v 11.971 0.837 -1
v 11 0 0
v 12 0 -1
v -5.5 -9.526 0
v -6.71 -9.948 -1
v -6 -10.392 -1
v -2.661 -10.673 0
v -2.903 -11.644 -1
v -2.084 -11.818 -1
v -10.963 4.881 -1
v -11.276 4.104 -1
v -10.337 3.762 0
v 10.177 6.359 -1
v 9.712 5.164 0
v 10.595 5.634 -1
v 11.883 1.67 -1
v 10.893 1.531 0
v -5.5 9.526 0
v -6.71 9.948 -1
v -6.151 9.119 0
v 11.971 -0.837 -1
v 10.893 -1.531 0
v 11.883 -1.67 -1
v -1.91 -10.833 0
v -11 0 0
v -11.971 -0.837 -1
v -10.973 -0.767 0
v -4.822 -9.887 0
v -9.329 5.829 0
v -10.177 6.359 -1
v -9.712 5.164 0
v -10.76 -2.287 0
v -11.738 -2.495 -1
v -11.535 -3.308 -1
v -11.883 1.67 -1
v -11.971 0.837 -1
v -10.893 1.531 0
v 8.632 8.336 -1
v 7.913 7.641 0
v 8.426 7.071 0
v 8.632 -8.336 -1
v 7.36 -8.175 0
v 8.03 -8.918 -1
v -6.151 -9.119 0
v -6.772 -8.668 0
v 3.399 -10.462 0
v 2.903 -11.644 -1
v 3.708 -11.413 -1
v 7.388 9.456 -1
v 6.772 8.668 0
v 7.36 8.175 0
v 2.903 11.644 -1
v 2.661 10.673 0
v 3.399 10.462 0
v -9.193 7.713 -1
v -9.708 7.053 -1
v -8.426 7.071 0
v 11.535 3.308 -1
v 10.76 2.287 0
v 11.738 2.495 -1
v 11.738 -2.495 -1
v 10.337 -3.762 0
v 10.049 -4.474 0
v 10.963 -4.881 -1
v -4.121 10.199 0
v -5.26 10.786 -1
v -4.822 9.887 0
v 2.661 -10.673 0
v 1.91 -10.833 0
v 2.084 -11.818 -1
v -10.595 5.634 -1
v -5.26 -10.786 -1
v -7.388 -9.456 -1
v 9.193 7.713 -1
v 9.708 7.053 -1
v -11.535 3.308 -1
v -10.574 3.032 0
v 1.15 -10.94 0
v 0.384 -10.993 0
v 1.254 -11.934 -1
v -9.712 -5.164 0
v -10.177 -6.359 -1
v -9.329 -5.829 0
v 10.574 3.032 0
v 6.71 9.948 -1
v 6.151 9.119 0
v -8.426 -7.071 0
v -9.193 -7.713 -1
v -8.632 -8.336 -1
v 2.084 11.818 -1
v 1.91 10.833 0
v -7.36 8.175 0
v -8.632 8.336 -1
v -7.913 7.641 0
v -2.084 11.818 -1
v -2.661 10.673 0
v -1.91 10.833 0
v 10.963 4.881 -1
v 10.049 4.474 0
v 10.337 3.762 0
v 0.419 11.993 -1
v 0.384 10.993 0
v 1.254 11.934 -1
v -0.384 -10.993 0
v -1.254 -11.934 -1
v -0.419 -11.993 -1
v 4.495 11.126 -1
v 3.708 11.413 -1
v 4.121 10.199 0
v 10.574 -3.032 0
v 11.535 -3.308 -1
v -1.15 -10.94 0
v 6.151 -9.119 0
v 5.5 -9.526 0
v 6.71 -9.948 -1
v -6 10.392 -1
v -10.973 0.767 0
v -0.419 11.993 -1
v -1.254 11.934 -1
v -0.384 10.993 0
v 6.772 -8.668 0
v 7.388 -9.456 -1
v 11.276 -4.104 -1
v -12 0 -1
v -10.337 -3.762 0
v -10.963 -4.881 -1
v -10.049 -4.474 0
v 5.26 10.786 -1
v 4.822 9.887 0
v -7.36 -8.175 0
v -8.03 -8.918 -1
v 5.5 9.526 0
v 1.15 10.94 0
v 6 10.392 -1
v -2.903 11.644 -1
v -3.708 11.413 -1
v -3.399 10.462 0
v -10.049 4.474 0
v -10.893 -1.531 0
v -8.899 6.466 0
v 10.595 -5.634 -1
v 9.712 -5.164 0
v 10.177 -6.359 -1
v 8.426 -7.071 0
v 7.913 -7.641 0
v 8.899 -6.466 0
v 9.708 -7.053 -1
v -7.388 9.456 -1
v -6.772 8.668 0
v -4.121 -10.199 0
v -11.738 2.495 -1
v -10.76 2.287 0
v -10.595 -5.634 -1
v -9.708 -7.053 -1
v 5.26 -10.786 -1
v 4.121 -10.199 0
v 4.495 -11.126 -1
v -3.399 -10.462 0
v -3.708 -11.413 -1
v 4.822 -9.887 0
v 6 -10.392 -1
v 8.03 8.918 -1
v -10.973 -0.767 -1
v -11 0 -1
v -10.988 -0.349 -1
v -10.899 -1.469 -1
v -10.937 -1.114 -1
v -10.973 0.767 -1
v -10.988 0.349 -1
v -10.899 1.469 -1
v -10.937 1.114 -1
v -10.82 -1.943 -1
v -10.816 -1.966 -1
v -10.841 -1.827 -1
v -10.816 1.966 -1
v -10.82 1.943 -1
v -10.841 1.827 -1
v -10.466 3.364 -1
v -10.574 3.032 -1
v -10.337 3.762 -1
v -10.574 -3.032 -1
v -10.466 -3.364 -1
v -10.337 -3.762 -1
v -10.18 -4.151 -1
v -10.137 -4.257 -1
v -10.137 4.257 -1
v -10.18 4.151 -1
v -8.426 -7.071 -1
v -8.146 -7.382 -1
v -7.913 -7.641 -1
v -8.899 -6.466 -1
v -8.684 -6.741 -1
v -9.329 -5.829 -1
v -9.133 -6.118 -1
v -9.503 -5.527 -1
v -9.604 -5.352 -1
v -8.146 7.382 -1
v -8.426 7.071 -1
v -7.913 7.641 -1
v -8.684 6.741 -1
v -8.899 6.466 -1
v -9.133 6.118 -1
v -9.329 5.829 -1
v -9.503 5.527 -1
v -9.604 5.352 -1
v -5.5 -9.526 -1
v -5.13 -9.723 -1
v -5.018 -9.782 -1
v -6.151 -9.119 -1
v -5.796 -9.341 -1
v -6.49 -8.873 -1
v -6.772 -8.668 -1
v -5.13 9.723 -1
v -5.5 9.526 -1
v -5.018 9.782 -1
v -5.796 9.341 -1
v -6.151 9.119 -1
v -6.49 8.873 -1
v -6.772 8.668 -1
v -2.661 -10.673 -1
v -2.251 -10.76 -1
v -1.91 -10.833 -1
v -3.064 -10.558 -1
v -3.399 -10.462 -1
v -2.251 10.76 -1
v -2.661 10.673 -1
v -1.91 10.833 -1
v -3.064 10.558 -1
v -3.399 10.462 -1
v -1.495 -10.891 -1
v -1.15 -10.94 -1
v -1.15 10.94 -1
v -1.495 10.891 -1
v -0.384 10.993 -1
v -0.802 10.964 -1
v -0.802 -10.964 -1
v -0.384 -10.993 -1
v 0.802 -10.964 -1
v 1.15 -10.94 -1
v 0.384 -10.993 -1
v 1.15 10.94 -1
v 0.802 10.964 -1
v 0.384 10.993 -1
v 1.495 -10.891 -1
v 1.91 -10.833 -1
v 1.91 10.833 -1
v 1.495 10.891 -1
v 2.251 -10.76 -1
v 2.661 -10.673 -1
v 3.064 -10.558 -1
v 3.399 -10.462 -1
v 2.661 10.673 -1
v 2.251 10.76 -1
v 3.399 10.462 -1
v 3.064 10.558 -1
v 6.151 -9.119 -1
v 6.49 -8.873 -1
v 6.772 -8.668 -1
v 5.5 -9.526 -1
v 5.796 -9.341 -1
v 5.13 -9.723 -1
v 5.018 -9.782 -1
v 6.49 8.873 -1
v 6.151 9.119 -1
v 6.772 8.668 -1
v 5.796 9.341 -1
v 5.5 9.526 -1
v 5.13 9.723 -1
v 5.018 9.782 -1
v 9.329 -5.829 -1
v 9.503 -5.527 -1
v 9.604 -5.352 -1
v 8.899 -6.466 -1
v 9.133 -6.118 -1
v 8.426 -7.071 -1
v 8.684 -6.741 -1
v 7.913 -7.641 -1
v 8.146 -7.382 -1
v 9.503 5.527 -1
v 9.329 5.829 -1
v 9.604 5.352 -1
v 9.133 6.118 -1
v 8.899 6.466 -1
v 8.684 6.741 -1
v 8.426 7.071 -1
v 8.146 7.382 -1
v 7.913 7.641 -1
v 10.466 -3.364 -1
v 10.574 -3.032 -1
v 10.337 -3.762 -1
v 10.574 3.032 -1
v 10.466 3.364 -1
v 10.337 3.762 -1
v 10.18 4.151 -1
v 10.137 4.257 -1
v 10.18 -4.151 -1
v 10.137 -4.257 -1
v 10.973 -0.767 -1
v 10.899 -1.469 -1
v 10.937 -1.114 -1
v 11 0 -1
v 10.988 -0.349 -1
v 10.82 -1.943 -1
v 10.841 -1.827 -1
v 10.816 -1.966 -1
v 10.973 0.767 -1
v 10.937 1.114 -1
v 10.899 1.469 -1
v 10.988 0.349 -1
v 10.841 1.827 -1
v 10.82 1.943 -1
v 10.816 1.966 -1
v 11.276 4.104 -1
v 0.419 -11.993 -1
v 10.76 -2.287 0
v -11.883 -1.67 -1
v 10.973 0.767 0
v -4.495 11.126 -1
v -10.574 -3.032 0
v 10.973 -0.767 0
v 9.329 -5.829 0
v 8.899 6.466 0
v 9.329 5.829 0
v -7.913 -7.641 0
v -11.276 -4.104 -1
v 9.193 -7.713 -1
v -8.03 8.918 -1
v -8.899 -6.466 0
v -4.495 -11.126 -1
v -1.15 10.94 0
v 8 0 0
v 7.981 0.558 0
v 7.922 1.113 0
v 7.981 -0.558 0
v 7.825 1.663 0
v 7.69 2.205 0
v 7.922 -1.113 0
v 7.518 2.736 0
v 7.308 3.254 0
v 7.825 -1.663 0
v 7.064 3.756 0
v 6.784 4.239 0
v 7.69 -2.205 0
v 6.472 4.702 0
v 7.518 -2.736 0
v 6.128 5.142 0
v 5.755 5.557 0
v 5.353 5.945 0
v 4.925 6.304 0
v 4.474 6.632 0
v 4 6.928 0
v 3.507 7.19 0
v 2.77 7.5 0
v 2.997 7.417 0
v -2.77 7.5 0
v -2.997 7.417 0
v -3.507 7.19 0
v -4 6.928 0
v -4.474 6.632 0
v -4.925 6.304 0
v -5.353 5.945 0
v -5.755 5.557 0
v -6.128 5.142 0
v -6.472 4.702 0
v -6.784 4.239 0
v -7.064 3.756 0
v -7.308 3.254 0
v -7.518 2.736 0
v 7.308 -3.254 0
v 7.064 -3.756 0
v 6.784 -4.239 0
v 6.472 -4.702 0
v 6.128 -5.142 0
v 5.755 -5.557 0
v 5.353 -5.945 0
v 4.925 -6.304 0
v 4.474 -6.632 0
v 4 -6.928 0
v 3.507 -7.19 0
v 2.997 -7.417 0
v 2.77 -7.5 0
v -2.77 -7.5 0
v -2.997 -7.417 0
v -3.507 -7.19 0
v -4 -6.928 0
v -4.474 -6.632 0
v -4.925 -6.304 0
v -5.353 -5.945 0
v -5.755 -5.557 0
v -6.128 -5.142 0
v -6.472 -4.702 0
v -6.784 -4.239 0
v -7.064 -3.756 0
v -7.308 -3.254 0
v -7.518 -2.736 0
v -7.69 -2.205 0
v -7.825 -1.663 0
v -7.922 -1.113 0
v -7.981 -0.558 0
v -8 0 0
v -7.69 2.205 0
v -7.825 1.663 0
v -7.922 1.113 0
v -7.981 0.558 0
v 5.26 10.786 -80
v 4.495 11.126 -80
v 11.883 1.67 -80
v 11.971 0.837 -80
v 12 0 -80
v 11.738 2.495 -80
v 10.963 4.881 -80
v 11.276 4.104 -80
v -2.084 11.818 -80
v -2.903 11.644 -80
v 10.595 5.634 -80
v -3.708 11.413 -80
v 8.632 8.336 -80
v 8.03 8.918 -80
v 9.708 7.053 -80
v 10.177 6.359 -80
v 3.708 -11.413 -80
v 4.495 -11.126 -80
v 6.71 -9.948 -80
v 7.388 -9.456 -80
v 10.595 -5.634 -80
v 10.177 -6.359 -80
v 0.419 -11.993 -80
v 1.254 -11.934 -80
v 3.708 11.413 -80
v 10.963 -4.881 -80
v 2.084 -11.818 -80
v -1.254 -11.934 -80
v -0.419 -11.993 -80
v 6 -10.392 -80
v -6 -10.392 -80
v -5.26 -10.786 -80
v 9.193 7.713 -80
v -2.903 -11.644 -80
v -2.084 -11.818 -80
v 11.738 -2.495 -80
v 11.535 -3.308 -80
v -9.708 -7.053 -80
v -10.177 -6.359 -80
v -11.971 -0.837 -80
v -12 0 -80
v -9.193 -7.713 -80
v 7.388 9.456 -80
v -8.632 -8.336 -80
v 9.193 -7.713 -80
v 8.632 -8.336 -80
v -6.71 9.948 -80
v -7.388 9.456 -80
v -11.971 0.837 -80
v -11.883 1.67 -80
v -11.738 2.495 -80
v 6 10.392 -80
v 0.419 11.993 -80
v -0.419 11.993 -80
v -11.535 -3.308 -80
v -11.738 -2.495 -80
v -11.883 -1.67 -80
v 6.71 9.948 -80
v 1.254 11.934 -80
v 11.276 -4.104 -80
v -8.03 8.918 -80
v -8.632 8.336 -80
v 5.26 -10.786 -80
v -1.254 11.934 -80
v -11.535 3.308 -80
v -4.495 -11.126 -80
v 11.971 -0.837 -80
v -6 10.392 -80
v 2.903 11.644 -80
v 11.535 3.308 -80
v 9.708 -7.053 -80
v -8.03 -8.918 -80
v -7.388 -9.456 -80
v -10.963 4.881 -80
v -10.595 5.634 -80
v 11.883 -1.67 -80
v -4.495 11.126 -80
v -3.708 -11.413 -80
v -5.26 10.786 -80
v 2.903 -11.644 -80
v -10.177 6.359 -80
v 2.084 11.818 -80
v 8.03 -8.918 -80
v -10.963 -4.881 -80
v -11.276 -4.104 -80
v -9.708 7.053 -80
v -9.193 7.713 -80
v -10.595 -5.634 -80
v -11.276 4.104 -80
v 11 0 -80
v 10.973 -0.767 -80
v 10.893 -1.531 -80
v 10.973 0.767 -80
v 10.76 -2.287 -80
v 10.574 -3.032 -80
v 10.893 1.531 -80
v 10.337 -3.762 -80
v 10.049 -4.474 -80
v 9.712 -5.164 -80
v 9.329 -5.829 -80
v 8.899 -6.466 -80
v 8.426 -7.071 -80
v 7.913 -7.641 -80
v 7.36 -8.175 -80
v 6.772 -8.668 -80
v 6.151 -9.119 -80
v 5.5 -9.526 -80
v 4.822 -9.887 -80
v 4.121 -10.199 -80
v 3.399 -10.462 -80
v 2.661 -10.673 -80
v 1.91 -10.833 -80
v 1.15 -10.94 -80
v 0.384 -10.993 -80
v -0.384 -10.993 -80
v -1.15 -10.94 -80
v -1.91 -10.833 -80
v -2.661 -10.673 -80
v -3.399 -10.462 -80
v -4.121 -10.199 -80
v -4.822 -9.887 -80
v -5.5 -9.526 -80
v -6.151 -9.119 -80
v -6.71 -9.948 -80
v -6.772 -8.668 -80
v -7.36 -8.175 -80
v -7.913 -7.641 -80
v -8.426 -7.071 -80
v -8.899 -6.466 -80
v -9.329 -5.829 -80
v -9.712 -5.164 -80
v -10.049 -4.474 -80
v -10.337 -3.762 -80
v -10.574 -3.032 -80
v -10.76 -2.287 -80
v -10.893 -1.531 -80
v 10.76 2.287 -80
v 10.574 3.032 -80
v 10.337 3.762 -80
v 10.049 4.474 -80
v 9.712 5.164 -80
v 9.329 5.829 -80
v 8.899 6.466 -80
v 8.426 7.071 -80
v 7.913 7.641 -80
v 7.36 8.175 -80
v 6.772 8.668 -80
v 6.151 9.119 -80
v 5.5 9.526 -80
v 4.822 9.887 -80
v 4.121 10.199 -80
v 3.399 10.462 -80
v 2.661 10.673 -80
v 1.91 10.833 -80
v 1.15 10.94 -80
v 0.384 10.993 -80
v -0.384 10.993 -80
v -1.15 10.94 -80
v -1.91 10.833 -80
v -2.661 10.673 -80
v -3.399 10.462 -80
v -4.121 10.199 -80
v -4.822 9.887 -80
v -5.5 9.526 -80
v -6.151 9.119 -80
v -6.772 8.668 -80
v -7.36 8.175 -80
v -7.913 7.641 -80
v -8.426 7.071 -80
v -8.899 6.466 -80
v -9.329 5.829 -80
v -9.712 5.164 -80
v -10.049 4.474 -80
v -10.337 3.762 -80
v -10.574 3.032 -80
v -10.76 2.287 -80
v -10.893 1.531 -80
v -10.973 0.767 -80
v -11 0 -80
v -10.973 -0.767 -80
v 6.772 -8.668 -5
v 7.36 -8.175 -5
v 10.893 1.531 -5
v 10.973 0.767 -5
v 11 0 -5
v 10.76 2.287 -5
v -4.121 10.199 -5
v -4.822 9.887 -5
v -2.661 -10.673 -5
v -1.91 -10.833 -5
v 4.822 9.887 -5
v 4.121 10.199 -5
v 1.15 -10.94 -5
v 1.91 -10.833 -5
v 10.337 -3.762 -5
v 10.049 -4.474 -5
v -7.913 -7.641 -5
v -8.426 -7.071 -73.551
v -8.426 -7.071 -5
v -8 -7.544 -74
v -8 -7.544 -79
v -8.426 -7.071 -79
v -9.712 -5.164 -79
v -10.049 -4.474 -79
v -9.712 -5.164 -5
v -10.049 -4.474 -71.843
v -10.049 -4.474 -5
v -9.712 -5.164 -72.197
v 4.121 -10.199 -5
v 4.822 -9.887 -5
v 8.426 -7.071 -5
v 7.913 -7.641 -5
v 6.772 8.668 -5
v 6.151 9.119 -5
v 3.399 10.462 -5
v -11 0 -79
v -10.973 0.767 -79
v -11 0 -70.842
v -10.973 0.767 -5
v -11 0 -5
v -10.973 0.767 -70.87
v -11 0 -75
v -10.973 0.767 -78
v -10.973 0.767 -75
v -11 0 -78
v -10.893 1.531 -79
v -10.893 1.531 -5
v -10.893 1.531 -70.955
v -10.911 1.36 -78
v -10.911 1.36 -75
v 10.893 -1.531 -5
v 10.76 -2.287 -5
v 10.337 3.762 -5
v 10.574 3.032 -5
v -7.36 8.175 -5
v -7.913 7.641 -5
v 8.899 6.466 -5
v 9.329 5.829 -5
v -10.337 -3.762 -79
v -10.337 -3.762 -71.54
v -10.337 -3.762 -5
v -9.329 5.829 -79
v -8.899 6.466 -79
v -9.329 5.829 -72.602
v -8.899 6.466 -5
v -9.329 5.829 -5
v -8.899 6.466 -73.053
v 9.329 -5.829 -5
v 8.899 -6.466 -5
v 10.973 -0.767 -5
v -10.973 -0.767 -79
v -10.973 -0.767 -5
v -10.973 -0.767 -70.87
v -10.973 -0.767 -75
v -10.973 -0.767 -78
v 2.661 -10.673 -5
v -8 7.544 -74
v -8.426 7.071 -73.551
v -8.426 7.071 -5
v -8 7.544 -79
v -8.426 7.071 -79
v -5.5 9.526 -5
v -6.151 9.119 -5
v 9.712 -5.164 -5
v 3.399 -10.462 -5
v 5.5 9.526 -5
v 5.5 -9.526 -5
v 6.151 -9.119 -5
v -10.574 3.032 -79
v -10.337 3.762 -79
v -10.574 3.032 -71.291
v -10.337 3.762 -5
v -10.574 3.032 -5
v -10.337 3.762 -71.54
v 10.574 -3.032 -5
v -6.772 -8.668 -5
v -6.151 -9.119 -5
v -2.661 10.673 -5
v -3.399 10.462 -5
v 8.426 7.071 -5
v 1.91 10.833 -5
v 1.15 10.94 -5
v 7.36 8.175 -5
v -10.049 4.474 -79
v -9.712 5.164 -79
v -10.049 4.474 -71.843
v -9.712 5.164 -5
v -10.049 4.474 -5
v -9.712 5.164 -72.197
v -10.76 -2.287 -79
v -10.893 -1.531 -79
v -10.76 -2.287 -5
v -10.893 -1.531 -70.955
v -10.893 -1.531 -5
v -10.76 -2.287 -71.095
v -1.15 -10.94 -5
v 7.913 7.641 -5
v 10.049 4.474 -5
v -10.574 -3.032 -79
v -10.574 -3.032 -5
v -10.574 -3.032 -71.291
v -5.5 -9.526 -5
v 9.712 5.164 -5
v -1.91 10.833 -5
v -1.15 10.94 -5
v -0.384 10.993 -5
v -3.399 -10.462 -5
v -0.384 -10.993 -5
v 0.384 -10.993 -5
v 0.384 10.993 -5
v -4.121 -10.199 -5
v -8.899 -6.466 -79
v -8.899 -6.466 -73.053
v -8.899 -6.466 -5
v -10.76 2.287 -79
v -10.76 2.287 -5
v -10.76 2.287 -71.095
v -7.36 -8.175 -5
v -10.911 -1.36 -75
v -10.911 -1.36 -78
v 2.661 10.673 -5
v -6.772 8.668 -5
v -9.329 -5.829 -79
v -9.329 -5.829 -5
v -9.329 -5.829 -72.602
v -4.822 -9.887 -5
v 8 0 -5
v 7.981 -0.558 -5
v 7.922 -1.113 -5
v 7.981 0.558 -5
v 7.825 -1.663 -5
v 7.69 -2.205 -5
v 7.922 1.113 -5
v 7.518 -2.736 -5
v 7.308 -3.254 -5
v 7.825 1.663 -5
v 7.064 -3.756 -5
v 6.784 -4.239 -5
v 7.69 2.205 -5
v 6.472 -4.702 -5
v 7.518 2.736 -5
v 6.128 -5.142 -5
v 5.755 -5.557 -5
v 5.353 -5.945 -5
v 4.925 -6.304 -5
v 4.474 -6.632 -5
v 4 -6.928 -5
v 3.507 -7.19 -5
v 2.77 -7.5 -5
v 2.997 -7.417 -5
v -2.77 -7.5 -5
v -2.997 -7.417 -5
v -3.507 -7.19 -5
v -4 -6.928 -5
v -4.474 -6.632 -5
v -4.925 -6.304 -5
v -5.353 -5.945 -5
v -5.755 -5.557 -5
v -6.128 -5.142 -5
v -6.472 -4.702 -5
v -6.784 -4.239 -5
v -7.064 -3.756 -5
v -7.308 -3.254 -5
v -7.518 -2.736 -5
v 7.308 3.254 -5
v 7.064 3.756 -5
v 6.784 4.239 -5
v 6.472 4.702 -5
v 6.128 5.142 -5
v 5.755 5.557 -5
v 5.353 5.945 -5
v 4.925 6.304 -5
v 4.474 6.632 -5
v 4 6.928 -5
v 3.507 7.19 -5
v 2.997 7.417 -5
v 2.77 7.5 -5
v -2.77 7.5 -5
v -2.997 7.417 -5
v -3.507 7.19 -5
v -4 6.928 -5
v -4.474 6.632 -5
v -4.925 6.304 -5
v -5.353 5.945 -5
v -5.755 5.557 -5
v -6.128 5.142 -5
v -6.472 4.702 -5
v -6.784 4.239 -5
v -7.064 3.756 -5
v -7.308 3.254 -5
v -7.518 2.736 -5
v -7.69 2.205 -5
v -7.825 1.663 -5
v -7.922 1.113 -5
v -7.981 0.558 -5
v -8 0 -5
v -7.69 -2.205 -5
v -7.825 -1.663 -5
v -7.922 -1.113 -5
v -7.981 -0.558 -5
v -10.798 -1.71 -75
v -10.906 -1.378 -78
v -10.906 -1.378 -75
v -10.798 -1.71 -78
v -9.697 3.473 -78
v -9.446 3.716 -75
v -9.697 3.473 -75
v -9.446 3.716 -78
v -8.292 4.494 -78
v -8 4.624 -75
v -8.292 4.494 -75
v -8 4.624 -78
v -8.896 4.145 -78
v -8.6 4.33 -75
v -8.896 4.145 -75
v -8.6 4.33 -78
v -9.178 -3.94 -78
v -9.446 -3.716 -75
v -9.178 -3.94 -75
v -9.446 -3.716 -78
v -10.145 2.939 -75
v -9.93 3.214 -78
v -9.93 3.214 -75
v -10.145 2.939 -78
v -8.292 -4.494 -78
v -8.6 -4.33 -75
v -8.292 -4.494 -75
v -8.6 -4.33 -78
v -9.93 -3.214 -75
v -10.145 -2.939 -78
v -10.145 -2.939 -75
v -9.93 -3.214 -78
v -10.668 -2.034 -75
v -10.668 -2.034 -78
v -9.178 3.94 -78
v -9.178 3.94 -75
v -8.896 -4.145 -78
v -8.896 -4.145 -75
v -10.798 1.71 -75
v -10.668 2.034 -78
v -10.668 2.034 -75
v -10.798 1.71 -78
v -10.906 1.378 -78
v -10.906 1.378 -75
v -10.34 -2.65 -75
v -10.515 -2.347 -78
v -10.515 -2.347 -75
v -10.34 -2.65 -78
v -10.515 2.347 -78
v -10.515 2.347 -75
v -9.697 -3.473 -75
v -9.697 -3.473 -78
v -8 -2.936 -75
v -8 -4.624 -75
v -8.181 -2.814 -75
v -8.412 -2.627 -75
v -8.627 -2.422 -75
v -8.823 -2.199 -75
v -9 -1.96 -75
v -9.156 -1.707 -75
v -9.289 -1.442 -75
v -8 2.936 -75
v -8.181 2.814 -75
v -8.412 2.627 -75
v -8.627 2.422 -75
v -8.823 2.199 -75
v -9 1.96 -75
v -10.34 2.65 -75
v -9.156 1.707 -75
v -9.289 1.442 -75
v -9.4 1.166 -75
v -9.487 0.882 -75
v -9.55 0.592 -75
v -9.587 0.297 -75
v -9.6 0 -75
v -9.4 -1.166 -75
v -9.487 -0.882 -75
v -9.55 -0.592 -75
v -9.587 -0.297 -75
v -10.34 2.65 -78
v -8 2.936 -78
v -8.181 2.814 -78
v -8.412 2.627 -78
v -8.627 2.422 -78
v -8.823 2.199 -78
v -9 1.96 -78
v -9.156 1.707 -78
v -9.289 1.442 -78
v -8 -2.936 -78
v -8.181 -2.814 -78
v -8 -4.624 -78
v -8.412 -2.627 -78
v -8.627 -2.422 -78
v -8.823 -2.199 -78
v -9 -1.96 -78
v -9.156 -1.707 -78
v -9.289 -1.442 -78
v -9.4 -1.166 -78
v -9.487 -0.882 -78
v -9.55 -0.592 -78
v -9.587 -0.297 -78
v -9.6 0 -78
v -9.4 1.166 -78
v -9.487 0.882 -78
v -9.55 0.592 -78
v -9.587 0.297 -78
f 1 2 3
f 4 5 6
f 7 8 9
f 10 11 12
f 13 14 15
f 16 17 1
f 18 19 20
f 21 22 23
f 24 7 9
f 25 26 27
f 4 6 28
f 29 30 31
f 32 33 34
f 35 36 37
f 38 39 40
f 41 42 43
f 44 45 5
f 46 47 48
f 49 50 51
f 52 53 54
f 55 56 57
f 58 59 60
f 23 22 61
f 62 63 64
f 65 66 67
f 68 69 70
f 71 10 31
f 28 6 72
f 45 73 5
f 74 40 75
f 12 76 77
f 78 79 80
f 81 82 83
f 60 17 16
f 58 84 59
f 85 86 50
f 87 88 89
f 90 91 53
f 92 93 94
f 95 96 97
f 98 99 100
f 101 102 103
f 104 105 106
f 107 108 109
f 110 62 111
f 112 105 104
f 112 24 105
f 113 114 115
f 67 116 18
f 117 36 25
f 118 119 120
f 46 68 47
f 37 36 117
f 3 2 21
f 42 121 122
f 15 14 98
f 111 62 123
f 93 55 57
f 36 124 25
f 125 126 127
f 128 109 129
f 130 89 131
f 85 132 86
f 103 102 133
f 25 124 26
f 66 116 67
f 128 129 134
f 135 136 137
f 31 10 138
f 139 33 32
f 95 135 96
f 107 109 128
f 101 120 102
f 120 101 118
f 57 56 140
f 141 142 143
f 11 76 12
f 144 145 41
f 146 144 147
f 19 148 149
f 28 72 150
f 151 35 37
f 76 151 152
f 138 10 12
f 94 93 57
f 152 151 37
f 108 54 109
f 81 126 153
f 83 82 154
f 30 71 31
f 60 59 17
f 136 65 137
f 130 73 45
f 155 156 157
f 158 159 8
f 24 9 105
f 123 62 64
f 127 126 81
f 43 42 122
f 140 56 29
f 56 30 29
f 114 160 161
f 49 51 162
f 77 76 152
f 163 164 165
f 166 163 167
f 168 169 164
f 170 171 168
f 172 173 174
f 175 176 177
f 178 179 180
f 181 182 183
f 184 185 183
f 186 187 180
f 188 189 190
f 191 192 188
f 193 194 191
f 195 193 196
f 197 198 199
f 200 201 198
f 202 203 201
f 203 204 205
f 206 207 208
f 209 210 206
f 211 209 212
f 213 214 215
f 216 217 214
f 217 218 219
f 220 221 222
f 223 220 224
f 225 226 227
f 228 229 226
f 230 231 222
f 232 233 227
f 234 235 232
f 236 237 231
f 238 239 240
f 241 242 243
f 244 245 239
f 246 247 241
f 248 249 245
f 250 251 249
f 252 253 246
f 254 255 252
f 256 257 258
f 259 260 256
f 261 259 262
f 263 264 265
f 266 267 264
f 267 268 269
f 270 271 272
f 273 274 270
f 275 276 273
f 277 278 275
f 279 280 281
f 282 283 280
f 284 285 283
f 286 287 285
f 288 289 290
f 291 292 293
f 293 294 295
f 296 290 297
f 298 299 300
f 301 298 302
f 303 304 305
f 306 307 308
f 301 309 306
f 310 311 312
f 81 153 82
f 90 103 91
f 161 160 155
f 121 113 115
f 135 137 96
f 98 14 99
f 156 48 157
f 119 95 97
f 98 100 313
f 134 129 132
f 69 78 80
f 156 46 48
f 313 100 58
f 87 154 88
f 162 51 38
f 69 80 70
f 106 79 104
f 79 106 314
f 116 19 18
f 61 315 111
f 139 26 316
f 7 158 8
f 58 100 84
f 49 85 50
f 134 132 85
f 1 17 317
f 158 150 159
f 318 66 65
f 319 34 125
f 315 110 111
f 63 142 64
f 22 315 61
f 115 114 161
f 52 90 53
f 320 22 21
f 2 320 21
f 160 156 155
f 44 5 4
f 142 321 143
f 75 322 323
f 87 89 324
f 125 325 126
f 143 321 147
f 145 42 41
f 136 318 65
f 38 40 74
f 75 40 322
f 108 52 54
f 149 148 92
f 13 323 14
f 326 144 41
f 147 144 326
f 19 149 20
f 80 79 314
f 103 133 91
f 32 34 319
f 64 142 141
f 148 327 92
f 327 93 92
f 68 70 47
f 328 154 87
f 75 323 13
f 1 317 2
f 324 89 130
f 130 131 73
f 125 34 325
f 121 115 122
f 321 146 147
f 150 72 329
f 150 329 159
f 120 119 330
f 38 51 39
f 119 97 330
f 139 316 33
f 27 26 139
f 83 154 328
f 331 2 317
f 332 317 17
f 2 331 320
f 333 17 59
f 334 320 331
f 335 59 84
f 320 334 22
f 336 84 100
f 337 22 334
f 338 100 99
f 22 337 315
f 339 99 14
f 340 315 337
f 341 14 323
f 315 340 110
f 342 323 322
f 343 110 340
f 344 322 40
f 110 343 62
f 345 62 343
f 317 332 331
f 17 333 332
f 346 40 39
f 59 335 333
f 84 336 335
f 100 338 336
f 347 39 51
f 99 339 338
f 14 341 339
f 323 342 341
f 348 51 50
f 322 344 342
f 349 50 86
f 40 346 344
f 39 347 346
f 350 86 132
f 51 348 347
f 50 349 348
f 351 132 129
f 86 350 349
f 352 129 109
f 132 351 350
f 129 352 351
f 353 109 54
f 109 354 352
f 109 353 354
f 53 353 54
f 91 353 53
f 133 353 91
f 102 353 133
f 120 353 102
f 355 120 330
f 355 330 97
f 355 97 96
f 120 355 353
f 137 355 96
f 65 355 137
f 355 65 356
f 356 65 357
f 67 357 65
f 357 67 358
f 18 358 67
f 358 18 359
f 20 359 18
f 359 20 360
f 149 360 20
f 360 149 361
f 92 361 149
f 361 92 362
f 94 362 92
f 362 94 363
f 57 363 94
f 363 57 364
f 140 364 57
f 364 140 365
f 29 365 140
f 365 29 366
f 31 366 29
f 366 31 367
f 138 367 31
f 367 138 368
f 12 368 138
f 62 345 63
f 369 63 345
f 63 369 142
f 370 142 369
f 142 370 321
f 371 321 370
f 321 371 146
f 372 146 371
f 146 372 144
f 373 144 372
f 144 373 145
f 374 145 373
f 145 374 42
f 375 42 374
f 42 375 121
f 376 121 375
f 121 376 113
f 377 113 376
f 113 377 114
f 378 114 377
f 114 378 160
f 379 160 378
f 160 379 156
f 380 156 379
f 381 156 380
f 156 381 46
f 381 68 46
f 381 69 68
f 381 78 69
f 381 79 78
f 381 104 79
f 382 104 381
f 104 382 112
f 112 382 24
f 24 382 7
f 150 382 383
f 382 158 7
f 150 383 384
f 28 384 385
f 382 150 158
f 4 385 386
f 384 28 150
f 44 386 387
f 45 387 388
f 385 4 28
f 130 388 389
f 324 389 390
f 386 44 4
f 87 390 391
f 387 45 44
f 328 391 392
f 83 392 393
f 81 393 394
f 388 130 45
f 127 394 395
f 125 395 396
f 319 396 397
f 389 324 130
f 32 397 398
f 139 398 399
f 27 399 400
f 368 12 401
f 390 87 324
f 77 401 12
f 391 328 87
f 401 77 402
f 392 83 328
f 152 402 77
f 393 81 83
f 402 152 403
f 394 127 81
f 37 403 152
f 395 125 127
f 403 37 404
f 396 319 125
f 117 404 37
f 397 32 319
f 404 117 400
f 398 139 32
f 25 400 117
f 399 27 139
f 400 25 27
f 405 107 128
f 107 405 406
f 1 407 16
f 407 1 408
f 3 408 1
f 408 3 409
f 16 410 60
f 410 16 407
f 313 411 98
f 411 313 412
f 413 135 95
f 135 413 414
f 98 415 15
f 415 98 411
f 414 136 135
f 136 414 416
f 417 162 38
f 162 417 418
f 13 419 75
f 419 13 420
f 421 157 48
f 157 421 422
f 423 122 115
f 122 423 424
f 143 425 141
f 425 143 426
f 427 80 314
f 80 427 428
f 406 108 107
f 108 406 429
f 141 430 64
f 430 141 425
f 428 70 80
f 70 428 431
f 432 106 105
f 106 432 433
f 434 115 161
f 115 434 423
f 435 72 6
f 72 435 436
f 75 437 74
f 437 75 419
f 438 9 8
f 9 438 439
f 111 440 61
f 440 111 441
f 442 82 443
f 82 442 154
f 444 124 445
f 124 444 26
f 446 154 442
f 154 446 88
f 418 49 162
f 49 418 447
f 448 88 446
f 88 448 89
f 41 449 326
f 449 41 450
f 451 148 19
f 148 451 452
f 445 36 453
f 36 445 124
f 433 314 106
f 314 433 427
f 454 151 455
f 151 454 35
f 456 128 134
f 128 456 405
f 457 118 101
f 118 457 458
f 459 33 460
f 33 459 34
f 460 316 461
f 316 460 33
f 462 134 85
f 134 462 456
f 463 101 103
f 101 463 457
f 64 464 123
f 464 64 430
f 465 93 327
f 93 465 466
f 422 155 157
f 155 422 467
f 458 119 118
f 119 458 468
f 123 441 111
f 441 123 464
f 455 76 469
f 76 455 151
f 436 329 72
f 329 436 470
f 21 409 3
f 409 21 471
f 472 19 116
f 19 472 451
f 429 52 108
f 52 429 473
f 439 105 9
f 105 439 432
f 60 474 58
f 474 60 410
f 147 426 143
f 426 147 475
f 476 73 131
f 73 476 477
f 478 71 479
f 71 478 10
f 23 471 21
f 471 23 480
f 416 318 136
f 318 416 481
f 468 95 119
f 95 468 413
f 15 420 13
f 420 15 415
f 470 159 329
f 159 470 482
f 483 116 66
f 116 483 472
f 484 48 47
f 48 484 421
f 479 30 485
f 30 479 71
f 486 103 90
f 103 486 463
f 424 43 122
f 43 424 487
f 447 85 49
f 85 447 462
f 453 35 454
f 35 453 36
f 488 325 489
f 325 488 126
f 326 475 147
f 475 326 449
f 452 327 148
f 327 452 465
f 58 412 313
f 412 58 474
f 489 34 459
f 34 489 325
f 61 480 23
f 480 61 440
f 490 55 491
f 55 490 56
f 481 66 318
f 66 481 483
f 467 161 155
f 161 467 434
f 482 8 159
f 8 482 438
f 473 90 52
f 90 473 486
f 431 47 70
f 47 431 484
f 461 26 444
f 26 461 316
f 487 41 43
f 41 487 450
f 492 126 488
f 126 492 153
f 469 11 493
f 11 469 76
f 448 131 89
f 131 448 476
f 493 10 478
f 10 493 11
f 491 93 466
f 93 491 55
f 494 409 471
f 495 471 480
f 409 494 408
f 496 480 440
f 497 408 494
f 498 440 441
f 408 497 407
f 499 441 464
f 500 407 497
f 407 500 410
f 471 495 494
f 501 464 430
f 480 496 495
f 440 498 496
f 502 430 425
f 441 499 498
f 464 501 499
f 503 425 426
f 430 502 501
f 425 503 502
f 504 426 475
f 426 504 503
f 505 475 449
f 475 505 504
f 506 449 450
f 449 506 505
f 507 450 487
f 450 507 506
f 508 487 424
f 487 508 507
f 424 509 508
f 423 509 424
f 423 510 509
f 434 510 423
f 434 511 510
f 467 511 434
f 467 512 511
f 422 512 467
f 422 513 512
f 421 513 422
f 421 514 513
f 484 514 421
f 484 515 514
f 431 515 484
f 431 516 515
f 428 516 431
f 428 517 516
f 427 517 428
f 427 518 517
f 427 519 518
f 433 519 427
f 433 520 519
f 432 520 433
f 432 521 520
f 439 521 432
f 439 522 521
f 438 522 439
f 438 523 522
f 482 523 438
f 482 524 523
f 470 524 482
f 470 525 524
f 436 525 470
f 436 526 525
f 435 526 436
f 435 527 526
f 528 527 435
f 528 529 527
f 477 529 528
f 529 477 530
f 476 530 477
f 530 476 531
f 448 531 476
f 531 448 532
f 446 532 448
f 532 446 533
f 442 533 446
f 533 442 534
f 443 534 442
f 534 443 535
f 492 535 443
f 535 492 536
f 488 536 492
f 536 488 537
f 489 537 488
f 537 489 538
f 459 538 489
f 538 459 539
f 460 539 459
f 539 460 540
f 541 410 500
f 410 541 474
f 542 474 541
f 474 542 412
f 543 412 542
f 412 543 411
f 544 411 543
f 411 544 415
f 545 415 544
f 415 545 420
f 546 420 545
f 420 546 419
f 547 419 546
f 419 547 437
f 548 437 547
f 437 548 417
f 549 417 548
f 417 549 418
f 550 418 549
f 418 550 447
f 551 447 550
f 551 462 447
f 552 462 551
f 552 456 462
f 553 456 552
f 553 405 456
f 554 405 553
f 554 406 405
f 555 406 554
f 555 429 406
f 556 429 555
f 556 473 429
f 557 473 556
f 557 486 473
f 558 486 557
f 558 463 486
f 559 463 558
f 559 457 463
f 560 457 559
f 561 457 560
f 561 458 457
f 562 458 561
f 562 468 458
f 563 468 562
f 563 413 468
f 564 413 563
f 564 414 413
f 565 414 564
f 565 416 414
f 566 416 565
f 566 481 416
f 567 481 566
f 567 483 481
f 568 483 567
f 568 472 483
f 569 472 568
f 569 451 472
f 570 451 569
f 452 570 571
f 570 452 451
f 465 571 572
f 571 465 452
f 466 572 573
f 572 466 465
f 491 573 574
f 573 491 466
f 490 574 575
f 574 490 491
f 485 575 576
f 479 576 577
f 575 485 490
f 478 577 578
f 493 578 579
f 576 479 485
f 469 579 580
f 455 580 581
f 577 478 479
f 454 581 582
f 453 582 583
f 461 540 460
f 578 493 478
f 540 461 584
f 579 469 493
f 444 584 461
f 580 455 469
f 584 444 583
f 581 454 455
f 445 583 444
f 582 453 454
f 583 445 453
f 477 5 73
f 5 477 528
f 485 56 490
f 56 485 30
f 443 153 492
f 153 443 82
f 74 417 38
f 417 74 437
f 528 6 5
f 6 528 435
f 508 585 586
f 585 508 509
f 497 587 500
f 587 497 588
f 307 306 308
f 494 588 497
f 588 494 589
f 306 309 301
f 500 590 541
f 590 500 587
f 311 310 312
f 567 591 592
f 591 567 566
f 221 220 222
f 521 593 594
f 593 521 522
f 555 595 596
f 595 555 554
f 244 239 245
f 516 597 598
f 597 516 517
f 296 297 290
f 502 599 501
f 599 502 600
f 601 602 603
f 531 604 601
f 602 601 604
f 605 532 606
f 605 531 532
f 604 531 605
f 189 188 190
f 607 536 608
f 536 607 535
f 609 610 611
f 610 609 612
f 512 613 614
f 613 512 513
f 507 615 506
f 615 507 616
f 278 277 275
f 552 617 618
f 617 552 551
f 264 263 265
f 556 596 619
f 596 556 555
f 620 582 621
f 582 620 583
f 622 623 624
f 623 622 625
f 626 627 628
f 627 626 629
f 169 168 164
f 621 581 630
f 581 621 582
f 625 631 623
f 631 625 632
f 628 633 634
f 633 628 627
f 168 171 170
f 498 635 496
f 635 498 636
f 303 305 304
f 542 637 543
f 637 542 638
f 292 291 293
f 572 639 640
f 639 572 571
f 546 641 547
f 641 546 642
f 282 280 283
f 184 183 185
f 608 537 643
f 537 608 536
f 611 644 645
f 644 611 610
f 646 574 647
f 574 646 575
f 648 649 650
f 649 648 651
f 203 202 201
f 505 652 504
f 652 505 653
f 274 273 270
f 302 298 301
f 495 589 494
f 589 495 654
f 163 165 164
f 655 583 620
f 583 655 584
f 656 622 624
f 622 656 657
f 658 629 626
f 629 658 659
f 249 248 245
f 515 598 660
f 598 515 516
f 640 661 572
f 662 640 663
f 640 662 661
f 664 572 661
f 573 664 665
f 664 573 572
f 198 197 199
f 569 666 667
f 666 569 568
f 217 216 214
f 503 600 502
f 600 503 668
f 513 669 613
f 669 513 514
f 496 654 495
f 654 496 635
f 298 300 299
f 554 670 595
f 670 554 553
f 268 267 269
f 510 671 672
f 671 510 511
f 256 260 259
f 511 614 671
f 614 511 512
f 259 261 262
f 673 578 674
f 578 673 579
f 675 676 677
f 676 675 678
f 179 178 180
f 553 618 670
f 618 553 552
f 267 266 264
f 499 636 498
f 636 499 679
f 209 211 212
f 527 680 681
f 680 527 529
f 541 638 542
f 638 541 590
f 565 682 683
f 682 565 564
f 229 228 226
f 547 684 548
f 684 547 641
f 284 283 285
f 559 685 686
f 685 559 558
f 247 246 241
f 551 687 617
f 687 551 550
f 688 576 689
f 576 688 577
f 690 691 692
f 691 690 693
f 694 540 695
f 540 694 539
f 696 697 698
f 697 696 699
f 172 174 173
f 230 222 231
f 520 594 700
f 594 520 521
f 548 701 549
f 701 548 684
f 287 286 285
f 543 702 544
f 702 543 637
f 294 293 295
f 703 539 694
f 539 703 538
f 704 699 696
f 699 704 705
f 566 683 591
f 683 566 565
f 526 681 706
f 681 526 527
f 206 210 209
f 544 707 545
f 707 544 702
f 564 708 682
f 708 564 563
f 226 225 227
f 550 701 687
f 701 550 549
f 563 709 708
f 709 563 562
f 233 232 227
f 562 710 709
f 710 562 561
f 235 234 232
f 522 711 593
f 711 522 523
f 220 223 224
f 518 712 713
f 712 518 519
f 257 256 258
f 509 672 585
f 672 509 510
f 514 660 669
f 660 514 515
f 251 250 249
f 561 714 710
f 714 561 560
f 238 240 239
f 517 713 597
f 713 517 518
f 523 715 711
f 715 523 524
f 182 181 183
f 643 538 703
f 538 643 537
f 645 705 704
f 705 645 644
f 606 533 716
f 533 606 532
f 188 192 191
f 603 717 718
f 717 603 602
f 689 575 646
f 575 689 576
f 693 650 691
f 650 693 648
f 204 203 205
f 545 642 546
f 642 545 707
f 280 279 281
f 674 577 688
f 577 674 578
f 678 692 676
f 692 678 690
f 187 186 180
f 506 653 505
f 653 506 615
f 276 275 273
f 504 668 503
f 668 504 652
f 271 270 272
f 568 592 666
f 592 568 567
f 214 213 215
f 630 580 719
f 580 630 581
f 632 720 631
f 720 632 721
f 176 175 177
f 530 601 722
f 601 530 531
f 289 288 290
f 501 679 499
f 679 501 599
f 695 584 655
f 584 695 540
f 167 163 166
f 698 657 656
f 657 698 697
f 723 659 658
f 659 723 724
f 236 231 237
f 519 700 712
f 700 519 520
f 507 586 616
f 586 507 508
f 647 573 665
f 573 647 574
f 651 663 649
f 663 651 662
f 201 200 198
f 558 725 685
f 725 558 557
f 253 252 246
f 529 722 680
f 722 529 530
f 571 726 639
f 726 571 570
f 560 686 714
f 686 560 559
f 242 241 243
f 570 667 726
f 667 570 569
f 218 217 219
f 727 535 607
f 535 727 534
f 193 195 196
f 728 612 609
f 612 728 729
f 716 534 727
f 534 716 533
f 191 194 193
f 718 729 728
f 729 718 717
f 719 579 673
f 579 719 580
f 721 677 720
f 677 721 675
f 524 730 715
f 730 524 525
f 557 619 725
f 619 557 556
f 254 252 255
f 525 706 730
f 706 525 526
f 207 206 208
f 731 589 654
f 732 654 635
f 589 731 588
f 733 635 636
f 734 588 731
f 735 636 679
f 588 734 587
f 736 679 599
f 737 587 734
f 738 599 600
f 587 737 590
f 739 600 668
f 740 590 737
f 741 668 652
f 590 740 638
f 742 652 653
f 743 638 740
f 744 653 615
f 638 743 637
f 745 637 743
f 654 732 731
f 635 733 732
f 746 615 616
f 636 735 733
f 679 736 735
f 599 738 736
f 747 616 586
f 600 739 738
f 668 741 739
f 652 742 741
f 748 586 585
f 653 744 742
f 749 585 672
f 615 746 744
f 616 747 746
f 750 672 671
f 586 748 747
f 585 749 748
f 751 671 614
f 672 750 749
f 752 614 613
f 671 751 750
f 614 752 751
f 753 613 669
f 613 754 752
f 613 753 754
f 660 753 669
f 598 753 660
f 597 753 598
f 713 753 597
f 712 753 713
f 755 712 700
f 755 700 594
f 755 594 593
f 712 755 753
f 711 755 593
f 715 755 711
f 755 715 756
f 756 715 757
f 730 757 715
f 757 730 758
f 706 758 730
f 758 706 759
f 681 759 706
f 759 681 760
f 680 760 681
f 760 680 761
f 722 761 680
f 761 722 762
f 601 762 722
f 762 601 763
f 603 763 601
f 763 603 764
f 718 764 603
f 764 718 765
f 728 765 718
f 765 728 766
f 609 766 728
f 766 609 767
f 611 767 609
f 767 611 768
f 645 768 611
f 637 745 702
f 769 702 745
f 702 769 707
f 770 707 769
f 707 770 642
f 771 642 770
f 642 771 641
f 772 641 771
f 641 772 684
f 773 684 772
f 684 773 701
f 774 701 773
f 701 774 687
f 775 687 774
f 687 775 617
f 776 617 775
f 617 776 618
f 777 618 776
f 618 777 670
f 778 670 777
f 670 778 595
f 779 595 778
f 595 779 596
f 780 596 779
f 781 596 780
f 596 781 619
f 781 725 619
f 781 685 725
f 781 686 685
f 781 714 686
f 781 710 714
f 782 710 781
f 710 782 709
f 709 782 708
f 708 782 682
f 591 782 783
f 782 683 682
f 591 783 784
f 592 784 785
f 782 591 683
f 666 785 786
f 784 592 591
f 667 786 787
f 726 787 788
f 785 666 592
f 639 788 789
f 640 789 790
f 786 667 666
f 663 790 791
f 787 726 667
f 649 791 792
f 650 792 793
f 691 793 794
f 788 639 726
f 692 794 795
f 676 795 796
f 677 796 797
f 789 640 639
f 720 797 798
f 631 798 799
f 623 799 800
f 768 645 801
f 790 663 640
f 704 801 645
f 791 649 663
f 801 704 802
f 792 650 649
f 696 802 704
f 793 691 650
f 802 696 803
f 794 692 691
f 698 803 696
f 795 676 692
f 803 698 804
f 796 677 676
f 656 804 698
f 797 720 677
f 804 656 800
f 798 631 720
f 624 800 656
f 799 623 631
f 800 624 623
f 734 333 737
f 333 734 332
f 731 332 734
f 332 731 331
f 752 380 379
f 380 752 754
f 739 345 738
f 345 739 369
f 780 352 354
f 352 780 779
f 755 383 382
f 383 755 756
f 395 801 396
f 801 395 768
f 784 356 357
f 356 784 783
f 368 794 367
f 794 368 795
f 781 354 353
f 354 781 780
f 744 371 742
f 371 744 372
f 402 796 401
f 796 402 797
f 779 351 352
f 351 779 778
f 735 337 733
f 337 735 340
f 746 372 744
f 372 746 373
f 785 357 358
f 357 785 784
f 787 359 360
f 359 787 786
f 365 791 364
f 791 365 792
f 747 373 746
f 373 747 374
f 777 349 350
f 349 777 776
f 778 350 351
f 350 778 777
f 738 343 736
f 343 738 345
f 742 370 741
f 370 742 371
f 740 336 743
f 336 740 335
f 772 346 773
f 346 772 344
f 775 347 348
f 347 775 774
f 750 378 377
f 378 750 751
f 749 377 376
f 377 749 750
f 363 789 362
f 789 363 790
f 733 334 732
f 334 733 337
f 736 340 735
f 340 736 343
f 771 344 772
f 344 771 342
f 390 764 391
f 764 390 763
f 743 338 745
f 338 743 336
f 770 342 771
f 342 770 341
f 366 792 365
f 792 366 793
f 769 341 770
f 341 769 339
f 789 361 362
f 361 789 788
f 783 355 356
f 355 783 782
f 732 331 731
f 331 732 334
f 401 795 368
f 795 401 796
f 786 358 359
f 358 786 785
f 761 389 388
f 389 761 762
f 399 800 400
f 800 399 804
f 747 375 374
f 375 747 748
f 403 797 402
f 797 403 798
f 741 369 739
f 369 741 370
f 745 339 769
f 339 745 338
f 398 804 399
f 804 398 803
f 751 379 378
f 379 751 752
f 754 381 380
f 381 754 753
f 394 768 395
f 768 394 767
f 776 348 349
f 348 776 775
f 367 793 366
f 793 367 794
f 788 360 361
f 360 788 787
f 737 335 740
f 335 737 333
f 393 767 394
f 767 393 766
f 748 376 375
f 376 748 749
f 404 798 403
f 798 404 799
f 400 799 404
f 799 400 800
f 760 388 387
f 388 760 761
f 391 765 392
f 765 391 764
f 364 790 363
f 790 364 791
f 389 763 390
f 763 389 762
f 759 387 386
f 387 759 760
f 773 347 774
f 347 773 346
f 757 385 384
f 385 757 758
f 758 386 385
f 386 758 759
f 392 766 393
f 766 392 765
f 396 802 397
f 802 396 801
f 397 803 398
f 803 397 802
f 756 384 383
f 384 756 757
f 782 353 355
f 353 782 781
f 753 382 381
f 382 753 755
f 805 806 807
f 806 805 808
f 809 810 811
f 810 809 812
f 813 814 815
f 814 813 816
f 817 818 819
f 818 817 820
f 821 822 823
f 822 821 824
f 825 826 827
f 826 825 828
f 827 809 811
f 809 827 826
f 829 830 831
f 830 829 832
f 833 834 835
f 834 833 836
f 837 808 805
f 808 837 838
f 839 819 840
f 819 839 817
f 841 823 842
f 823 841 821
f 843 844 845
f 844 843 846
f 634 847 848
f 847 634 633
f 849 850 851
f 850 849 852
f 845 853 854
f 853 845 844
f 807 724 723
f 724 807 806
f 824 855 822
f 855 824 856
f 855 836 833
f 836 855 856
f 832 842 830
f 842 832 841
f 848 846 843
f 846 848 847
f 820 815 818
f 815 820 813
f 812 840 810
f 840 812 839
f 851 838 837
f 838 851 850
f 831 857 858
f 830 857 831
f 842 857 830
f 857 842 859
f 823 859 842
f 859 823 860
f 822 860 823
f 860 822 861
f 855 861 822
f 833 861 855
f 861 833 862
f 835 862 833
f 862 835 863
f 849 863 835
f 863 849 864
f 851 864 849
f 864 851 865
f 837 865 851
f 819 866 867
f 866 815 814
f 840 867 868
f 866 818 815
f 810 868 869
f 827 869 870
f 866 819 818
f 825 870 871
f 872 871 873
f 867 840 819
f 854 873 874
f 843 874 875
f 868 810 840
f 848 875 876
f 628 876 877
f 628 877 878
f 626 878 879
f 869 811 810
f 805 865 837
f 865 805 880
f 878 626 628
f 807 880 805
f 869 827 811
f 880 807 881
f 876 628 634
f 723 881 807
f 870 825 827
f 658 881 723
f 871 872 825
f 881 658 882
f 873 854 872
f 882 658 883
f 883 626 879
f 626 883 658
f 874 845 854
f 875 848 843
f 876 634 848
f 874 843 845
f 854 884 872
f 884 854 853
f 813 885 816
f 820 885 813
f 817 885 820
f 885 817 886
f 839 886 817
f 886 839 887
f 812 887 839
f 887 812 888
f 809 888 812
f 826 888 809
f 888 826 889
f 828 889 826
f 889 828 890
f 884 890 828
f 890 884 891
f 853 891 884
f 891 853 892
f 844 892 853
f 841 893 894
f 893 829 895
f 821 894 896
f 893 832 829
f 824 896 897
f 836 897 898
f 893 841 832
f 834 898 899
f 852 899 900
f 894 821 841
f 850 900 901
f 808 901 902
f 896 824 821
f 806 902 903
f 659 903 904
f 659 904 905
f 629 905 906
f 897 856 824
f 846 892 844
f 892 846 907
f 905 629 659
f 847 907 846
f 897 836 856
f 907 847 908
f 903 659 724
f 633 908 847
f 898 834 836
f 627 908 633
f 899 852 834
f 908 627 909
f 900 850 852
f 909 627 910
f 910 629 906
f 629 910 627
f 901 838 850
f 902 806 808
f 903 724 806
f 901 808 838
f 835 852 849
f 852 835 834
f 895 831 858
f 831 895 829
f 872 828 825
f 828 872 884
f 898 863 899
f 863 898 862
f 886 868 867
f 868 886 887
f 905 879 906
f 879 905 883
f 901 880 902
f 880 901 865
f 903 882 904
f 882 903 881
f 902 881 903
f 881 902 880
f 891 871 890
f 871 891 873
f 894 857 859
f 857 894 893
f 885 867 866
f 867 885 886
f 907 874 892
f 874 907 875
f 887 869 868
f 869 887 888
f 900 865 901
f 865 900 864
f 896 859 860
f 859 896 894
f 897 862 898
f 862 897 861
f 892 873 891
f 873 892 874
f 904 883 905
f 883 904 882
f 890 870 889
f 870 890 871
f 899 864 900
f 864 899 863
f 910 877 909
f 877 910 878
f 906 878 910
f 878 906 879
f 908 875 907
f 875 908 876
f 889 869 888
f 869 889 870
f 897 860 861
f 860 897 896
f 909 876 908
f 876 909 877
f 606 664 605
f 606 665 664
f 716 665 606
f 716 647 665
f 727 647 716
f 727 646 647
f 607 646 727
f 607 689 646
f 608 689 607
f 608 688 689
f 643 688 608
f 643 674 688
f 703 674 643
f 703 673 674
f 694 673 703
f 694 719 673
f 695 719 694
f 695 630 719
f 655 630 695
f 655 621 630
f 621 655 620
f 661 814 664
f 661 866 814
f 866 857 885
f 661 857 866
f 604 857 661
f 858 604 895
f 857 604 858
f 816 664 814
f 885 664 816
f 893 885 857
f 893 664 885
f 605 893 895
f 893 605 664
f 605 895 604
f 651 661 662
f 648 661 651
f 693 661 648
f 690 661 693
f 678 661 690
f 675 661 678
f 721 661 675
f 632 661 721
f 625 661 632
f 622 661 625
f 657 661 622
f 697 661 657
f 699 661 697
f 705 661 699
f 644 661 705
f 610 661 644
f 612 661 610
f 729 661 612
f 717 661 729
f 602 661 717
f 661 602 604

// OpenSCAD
$fa = 4;
$fs = 0.3;

include <BOSL/constants.scad>
use <BOSL/shapes.scad>
//use <BOSL/metric_screws.scad>

h = 80;

union() {
    tube(1, od1=24, od2=22, wall=1, align=ALIGN_NEG);
    translate([0, 0, -1]) tube(h-1, od=24, wall=1, align=ALIGN_NEG);
    tube(5, od=22, id=16, align=ALIGN_NEG);
    difference() {
        cyl(5, d=22, align=ALIGN_NEG);
        cuboid([24, 15, 5], align=ALIGN_NEG); /* Bump to 15.2 for a looser fit */
    }
    translate([0, 0, -h+1]) difference() {
        cyl(10, d=24, align=ALIGN_POS);
        translate([-8, 0, 0]) cuboid([24, 64, 5 * 10], align=V_RIGHT);
        translate([-8, 0, 10]) prismoid(size1=[24, 64], size2=[43, 64], h=10, align=V_RIGHT);
        translate([-6.1, 0, 1]) tube(3, od=10, wall=1.5, align=ALIGN_POS);
    }
}
